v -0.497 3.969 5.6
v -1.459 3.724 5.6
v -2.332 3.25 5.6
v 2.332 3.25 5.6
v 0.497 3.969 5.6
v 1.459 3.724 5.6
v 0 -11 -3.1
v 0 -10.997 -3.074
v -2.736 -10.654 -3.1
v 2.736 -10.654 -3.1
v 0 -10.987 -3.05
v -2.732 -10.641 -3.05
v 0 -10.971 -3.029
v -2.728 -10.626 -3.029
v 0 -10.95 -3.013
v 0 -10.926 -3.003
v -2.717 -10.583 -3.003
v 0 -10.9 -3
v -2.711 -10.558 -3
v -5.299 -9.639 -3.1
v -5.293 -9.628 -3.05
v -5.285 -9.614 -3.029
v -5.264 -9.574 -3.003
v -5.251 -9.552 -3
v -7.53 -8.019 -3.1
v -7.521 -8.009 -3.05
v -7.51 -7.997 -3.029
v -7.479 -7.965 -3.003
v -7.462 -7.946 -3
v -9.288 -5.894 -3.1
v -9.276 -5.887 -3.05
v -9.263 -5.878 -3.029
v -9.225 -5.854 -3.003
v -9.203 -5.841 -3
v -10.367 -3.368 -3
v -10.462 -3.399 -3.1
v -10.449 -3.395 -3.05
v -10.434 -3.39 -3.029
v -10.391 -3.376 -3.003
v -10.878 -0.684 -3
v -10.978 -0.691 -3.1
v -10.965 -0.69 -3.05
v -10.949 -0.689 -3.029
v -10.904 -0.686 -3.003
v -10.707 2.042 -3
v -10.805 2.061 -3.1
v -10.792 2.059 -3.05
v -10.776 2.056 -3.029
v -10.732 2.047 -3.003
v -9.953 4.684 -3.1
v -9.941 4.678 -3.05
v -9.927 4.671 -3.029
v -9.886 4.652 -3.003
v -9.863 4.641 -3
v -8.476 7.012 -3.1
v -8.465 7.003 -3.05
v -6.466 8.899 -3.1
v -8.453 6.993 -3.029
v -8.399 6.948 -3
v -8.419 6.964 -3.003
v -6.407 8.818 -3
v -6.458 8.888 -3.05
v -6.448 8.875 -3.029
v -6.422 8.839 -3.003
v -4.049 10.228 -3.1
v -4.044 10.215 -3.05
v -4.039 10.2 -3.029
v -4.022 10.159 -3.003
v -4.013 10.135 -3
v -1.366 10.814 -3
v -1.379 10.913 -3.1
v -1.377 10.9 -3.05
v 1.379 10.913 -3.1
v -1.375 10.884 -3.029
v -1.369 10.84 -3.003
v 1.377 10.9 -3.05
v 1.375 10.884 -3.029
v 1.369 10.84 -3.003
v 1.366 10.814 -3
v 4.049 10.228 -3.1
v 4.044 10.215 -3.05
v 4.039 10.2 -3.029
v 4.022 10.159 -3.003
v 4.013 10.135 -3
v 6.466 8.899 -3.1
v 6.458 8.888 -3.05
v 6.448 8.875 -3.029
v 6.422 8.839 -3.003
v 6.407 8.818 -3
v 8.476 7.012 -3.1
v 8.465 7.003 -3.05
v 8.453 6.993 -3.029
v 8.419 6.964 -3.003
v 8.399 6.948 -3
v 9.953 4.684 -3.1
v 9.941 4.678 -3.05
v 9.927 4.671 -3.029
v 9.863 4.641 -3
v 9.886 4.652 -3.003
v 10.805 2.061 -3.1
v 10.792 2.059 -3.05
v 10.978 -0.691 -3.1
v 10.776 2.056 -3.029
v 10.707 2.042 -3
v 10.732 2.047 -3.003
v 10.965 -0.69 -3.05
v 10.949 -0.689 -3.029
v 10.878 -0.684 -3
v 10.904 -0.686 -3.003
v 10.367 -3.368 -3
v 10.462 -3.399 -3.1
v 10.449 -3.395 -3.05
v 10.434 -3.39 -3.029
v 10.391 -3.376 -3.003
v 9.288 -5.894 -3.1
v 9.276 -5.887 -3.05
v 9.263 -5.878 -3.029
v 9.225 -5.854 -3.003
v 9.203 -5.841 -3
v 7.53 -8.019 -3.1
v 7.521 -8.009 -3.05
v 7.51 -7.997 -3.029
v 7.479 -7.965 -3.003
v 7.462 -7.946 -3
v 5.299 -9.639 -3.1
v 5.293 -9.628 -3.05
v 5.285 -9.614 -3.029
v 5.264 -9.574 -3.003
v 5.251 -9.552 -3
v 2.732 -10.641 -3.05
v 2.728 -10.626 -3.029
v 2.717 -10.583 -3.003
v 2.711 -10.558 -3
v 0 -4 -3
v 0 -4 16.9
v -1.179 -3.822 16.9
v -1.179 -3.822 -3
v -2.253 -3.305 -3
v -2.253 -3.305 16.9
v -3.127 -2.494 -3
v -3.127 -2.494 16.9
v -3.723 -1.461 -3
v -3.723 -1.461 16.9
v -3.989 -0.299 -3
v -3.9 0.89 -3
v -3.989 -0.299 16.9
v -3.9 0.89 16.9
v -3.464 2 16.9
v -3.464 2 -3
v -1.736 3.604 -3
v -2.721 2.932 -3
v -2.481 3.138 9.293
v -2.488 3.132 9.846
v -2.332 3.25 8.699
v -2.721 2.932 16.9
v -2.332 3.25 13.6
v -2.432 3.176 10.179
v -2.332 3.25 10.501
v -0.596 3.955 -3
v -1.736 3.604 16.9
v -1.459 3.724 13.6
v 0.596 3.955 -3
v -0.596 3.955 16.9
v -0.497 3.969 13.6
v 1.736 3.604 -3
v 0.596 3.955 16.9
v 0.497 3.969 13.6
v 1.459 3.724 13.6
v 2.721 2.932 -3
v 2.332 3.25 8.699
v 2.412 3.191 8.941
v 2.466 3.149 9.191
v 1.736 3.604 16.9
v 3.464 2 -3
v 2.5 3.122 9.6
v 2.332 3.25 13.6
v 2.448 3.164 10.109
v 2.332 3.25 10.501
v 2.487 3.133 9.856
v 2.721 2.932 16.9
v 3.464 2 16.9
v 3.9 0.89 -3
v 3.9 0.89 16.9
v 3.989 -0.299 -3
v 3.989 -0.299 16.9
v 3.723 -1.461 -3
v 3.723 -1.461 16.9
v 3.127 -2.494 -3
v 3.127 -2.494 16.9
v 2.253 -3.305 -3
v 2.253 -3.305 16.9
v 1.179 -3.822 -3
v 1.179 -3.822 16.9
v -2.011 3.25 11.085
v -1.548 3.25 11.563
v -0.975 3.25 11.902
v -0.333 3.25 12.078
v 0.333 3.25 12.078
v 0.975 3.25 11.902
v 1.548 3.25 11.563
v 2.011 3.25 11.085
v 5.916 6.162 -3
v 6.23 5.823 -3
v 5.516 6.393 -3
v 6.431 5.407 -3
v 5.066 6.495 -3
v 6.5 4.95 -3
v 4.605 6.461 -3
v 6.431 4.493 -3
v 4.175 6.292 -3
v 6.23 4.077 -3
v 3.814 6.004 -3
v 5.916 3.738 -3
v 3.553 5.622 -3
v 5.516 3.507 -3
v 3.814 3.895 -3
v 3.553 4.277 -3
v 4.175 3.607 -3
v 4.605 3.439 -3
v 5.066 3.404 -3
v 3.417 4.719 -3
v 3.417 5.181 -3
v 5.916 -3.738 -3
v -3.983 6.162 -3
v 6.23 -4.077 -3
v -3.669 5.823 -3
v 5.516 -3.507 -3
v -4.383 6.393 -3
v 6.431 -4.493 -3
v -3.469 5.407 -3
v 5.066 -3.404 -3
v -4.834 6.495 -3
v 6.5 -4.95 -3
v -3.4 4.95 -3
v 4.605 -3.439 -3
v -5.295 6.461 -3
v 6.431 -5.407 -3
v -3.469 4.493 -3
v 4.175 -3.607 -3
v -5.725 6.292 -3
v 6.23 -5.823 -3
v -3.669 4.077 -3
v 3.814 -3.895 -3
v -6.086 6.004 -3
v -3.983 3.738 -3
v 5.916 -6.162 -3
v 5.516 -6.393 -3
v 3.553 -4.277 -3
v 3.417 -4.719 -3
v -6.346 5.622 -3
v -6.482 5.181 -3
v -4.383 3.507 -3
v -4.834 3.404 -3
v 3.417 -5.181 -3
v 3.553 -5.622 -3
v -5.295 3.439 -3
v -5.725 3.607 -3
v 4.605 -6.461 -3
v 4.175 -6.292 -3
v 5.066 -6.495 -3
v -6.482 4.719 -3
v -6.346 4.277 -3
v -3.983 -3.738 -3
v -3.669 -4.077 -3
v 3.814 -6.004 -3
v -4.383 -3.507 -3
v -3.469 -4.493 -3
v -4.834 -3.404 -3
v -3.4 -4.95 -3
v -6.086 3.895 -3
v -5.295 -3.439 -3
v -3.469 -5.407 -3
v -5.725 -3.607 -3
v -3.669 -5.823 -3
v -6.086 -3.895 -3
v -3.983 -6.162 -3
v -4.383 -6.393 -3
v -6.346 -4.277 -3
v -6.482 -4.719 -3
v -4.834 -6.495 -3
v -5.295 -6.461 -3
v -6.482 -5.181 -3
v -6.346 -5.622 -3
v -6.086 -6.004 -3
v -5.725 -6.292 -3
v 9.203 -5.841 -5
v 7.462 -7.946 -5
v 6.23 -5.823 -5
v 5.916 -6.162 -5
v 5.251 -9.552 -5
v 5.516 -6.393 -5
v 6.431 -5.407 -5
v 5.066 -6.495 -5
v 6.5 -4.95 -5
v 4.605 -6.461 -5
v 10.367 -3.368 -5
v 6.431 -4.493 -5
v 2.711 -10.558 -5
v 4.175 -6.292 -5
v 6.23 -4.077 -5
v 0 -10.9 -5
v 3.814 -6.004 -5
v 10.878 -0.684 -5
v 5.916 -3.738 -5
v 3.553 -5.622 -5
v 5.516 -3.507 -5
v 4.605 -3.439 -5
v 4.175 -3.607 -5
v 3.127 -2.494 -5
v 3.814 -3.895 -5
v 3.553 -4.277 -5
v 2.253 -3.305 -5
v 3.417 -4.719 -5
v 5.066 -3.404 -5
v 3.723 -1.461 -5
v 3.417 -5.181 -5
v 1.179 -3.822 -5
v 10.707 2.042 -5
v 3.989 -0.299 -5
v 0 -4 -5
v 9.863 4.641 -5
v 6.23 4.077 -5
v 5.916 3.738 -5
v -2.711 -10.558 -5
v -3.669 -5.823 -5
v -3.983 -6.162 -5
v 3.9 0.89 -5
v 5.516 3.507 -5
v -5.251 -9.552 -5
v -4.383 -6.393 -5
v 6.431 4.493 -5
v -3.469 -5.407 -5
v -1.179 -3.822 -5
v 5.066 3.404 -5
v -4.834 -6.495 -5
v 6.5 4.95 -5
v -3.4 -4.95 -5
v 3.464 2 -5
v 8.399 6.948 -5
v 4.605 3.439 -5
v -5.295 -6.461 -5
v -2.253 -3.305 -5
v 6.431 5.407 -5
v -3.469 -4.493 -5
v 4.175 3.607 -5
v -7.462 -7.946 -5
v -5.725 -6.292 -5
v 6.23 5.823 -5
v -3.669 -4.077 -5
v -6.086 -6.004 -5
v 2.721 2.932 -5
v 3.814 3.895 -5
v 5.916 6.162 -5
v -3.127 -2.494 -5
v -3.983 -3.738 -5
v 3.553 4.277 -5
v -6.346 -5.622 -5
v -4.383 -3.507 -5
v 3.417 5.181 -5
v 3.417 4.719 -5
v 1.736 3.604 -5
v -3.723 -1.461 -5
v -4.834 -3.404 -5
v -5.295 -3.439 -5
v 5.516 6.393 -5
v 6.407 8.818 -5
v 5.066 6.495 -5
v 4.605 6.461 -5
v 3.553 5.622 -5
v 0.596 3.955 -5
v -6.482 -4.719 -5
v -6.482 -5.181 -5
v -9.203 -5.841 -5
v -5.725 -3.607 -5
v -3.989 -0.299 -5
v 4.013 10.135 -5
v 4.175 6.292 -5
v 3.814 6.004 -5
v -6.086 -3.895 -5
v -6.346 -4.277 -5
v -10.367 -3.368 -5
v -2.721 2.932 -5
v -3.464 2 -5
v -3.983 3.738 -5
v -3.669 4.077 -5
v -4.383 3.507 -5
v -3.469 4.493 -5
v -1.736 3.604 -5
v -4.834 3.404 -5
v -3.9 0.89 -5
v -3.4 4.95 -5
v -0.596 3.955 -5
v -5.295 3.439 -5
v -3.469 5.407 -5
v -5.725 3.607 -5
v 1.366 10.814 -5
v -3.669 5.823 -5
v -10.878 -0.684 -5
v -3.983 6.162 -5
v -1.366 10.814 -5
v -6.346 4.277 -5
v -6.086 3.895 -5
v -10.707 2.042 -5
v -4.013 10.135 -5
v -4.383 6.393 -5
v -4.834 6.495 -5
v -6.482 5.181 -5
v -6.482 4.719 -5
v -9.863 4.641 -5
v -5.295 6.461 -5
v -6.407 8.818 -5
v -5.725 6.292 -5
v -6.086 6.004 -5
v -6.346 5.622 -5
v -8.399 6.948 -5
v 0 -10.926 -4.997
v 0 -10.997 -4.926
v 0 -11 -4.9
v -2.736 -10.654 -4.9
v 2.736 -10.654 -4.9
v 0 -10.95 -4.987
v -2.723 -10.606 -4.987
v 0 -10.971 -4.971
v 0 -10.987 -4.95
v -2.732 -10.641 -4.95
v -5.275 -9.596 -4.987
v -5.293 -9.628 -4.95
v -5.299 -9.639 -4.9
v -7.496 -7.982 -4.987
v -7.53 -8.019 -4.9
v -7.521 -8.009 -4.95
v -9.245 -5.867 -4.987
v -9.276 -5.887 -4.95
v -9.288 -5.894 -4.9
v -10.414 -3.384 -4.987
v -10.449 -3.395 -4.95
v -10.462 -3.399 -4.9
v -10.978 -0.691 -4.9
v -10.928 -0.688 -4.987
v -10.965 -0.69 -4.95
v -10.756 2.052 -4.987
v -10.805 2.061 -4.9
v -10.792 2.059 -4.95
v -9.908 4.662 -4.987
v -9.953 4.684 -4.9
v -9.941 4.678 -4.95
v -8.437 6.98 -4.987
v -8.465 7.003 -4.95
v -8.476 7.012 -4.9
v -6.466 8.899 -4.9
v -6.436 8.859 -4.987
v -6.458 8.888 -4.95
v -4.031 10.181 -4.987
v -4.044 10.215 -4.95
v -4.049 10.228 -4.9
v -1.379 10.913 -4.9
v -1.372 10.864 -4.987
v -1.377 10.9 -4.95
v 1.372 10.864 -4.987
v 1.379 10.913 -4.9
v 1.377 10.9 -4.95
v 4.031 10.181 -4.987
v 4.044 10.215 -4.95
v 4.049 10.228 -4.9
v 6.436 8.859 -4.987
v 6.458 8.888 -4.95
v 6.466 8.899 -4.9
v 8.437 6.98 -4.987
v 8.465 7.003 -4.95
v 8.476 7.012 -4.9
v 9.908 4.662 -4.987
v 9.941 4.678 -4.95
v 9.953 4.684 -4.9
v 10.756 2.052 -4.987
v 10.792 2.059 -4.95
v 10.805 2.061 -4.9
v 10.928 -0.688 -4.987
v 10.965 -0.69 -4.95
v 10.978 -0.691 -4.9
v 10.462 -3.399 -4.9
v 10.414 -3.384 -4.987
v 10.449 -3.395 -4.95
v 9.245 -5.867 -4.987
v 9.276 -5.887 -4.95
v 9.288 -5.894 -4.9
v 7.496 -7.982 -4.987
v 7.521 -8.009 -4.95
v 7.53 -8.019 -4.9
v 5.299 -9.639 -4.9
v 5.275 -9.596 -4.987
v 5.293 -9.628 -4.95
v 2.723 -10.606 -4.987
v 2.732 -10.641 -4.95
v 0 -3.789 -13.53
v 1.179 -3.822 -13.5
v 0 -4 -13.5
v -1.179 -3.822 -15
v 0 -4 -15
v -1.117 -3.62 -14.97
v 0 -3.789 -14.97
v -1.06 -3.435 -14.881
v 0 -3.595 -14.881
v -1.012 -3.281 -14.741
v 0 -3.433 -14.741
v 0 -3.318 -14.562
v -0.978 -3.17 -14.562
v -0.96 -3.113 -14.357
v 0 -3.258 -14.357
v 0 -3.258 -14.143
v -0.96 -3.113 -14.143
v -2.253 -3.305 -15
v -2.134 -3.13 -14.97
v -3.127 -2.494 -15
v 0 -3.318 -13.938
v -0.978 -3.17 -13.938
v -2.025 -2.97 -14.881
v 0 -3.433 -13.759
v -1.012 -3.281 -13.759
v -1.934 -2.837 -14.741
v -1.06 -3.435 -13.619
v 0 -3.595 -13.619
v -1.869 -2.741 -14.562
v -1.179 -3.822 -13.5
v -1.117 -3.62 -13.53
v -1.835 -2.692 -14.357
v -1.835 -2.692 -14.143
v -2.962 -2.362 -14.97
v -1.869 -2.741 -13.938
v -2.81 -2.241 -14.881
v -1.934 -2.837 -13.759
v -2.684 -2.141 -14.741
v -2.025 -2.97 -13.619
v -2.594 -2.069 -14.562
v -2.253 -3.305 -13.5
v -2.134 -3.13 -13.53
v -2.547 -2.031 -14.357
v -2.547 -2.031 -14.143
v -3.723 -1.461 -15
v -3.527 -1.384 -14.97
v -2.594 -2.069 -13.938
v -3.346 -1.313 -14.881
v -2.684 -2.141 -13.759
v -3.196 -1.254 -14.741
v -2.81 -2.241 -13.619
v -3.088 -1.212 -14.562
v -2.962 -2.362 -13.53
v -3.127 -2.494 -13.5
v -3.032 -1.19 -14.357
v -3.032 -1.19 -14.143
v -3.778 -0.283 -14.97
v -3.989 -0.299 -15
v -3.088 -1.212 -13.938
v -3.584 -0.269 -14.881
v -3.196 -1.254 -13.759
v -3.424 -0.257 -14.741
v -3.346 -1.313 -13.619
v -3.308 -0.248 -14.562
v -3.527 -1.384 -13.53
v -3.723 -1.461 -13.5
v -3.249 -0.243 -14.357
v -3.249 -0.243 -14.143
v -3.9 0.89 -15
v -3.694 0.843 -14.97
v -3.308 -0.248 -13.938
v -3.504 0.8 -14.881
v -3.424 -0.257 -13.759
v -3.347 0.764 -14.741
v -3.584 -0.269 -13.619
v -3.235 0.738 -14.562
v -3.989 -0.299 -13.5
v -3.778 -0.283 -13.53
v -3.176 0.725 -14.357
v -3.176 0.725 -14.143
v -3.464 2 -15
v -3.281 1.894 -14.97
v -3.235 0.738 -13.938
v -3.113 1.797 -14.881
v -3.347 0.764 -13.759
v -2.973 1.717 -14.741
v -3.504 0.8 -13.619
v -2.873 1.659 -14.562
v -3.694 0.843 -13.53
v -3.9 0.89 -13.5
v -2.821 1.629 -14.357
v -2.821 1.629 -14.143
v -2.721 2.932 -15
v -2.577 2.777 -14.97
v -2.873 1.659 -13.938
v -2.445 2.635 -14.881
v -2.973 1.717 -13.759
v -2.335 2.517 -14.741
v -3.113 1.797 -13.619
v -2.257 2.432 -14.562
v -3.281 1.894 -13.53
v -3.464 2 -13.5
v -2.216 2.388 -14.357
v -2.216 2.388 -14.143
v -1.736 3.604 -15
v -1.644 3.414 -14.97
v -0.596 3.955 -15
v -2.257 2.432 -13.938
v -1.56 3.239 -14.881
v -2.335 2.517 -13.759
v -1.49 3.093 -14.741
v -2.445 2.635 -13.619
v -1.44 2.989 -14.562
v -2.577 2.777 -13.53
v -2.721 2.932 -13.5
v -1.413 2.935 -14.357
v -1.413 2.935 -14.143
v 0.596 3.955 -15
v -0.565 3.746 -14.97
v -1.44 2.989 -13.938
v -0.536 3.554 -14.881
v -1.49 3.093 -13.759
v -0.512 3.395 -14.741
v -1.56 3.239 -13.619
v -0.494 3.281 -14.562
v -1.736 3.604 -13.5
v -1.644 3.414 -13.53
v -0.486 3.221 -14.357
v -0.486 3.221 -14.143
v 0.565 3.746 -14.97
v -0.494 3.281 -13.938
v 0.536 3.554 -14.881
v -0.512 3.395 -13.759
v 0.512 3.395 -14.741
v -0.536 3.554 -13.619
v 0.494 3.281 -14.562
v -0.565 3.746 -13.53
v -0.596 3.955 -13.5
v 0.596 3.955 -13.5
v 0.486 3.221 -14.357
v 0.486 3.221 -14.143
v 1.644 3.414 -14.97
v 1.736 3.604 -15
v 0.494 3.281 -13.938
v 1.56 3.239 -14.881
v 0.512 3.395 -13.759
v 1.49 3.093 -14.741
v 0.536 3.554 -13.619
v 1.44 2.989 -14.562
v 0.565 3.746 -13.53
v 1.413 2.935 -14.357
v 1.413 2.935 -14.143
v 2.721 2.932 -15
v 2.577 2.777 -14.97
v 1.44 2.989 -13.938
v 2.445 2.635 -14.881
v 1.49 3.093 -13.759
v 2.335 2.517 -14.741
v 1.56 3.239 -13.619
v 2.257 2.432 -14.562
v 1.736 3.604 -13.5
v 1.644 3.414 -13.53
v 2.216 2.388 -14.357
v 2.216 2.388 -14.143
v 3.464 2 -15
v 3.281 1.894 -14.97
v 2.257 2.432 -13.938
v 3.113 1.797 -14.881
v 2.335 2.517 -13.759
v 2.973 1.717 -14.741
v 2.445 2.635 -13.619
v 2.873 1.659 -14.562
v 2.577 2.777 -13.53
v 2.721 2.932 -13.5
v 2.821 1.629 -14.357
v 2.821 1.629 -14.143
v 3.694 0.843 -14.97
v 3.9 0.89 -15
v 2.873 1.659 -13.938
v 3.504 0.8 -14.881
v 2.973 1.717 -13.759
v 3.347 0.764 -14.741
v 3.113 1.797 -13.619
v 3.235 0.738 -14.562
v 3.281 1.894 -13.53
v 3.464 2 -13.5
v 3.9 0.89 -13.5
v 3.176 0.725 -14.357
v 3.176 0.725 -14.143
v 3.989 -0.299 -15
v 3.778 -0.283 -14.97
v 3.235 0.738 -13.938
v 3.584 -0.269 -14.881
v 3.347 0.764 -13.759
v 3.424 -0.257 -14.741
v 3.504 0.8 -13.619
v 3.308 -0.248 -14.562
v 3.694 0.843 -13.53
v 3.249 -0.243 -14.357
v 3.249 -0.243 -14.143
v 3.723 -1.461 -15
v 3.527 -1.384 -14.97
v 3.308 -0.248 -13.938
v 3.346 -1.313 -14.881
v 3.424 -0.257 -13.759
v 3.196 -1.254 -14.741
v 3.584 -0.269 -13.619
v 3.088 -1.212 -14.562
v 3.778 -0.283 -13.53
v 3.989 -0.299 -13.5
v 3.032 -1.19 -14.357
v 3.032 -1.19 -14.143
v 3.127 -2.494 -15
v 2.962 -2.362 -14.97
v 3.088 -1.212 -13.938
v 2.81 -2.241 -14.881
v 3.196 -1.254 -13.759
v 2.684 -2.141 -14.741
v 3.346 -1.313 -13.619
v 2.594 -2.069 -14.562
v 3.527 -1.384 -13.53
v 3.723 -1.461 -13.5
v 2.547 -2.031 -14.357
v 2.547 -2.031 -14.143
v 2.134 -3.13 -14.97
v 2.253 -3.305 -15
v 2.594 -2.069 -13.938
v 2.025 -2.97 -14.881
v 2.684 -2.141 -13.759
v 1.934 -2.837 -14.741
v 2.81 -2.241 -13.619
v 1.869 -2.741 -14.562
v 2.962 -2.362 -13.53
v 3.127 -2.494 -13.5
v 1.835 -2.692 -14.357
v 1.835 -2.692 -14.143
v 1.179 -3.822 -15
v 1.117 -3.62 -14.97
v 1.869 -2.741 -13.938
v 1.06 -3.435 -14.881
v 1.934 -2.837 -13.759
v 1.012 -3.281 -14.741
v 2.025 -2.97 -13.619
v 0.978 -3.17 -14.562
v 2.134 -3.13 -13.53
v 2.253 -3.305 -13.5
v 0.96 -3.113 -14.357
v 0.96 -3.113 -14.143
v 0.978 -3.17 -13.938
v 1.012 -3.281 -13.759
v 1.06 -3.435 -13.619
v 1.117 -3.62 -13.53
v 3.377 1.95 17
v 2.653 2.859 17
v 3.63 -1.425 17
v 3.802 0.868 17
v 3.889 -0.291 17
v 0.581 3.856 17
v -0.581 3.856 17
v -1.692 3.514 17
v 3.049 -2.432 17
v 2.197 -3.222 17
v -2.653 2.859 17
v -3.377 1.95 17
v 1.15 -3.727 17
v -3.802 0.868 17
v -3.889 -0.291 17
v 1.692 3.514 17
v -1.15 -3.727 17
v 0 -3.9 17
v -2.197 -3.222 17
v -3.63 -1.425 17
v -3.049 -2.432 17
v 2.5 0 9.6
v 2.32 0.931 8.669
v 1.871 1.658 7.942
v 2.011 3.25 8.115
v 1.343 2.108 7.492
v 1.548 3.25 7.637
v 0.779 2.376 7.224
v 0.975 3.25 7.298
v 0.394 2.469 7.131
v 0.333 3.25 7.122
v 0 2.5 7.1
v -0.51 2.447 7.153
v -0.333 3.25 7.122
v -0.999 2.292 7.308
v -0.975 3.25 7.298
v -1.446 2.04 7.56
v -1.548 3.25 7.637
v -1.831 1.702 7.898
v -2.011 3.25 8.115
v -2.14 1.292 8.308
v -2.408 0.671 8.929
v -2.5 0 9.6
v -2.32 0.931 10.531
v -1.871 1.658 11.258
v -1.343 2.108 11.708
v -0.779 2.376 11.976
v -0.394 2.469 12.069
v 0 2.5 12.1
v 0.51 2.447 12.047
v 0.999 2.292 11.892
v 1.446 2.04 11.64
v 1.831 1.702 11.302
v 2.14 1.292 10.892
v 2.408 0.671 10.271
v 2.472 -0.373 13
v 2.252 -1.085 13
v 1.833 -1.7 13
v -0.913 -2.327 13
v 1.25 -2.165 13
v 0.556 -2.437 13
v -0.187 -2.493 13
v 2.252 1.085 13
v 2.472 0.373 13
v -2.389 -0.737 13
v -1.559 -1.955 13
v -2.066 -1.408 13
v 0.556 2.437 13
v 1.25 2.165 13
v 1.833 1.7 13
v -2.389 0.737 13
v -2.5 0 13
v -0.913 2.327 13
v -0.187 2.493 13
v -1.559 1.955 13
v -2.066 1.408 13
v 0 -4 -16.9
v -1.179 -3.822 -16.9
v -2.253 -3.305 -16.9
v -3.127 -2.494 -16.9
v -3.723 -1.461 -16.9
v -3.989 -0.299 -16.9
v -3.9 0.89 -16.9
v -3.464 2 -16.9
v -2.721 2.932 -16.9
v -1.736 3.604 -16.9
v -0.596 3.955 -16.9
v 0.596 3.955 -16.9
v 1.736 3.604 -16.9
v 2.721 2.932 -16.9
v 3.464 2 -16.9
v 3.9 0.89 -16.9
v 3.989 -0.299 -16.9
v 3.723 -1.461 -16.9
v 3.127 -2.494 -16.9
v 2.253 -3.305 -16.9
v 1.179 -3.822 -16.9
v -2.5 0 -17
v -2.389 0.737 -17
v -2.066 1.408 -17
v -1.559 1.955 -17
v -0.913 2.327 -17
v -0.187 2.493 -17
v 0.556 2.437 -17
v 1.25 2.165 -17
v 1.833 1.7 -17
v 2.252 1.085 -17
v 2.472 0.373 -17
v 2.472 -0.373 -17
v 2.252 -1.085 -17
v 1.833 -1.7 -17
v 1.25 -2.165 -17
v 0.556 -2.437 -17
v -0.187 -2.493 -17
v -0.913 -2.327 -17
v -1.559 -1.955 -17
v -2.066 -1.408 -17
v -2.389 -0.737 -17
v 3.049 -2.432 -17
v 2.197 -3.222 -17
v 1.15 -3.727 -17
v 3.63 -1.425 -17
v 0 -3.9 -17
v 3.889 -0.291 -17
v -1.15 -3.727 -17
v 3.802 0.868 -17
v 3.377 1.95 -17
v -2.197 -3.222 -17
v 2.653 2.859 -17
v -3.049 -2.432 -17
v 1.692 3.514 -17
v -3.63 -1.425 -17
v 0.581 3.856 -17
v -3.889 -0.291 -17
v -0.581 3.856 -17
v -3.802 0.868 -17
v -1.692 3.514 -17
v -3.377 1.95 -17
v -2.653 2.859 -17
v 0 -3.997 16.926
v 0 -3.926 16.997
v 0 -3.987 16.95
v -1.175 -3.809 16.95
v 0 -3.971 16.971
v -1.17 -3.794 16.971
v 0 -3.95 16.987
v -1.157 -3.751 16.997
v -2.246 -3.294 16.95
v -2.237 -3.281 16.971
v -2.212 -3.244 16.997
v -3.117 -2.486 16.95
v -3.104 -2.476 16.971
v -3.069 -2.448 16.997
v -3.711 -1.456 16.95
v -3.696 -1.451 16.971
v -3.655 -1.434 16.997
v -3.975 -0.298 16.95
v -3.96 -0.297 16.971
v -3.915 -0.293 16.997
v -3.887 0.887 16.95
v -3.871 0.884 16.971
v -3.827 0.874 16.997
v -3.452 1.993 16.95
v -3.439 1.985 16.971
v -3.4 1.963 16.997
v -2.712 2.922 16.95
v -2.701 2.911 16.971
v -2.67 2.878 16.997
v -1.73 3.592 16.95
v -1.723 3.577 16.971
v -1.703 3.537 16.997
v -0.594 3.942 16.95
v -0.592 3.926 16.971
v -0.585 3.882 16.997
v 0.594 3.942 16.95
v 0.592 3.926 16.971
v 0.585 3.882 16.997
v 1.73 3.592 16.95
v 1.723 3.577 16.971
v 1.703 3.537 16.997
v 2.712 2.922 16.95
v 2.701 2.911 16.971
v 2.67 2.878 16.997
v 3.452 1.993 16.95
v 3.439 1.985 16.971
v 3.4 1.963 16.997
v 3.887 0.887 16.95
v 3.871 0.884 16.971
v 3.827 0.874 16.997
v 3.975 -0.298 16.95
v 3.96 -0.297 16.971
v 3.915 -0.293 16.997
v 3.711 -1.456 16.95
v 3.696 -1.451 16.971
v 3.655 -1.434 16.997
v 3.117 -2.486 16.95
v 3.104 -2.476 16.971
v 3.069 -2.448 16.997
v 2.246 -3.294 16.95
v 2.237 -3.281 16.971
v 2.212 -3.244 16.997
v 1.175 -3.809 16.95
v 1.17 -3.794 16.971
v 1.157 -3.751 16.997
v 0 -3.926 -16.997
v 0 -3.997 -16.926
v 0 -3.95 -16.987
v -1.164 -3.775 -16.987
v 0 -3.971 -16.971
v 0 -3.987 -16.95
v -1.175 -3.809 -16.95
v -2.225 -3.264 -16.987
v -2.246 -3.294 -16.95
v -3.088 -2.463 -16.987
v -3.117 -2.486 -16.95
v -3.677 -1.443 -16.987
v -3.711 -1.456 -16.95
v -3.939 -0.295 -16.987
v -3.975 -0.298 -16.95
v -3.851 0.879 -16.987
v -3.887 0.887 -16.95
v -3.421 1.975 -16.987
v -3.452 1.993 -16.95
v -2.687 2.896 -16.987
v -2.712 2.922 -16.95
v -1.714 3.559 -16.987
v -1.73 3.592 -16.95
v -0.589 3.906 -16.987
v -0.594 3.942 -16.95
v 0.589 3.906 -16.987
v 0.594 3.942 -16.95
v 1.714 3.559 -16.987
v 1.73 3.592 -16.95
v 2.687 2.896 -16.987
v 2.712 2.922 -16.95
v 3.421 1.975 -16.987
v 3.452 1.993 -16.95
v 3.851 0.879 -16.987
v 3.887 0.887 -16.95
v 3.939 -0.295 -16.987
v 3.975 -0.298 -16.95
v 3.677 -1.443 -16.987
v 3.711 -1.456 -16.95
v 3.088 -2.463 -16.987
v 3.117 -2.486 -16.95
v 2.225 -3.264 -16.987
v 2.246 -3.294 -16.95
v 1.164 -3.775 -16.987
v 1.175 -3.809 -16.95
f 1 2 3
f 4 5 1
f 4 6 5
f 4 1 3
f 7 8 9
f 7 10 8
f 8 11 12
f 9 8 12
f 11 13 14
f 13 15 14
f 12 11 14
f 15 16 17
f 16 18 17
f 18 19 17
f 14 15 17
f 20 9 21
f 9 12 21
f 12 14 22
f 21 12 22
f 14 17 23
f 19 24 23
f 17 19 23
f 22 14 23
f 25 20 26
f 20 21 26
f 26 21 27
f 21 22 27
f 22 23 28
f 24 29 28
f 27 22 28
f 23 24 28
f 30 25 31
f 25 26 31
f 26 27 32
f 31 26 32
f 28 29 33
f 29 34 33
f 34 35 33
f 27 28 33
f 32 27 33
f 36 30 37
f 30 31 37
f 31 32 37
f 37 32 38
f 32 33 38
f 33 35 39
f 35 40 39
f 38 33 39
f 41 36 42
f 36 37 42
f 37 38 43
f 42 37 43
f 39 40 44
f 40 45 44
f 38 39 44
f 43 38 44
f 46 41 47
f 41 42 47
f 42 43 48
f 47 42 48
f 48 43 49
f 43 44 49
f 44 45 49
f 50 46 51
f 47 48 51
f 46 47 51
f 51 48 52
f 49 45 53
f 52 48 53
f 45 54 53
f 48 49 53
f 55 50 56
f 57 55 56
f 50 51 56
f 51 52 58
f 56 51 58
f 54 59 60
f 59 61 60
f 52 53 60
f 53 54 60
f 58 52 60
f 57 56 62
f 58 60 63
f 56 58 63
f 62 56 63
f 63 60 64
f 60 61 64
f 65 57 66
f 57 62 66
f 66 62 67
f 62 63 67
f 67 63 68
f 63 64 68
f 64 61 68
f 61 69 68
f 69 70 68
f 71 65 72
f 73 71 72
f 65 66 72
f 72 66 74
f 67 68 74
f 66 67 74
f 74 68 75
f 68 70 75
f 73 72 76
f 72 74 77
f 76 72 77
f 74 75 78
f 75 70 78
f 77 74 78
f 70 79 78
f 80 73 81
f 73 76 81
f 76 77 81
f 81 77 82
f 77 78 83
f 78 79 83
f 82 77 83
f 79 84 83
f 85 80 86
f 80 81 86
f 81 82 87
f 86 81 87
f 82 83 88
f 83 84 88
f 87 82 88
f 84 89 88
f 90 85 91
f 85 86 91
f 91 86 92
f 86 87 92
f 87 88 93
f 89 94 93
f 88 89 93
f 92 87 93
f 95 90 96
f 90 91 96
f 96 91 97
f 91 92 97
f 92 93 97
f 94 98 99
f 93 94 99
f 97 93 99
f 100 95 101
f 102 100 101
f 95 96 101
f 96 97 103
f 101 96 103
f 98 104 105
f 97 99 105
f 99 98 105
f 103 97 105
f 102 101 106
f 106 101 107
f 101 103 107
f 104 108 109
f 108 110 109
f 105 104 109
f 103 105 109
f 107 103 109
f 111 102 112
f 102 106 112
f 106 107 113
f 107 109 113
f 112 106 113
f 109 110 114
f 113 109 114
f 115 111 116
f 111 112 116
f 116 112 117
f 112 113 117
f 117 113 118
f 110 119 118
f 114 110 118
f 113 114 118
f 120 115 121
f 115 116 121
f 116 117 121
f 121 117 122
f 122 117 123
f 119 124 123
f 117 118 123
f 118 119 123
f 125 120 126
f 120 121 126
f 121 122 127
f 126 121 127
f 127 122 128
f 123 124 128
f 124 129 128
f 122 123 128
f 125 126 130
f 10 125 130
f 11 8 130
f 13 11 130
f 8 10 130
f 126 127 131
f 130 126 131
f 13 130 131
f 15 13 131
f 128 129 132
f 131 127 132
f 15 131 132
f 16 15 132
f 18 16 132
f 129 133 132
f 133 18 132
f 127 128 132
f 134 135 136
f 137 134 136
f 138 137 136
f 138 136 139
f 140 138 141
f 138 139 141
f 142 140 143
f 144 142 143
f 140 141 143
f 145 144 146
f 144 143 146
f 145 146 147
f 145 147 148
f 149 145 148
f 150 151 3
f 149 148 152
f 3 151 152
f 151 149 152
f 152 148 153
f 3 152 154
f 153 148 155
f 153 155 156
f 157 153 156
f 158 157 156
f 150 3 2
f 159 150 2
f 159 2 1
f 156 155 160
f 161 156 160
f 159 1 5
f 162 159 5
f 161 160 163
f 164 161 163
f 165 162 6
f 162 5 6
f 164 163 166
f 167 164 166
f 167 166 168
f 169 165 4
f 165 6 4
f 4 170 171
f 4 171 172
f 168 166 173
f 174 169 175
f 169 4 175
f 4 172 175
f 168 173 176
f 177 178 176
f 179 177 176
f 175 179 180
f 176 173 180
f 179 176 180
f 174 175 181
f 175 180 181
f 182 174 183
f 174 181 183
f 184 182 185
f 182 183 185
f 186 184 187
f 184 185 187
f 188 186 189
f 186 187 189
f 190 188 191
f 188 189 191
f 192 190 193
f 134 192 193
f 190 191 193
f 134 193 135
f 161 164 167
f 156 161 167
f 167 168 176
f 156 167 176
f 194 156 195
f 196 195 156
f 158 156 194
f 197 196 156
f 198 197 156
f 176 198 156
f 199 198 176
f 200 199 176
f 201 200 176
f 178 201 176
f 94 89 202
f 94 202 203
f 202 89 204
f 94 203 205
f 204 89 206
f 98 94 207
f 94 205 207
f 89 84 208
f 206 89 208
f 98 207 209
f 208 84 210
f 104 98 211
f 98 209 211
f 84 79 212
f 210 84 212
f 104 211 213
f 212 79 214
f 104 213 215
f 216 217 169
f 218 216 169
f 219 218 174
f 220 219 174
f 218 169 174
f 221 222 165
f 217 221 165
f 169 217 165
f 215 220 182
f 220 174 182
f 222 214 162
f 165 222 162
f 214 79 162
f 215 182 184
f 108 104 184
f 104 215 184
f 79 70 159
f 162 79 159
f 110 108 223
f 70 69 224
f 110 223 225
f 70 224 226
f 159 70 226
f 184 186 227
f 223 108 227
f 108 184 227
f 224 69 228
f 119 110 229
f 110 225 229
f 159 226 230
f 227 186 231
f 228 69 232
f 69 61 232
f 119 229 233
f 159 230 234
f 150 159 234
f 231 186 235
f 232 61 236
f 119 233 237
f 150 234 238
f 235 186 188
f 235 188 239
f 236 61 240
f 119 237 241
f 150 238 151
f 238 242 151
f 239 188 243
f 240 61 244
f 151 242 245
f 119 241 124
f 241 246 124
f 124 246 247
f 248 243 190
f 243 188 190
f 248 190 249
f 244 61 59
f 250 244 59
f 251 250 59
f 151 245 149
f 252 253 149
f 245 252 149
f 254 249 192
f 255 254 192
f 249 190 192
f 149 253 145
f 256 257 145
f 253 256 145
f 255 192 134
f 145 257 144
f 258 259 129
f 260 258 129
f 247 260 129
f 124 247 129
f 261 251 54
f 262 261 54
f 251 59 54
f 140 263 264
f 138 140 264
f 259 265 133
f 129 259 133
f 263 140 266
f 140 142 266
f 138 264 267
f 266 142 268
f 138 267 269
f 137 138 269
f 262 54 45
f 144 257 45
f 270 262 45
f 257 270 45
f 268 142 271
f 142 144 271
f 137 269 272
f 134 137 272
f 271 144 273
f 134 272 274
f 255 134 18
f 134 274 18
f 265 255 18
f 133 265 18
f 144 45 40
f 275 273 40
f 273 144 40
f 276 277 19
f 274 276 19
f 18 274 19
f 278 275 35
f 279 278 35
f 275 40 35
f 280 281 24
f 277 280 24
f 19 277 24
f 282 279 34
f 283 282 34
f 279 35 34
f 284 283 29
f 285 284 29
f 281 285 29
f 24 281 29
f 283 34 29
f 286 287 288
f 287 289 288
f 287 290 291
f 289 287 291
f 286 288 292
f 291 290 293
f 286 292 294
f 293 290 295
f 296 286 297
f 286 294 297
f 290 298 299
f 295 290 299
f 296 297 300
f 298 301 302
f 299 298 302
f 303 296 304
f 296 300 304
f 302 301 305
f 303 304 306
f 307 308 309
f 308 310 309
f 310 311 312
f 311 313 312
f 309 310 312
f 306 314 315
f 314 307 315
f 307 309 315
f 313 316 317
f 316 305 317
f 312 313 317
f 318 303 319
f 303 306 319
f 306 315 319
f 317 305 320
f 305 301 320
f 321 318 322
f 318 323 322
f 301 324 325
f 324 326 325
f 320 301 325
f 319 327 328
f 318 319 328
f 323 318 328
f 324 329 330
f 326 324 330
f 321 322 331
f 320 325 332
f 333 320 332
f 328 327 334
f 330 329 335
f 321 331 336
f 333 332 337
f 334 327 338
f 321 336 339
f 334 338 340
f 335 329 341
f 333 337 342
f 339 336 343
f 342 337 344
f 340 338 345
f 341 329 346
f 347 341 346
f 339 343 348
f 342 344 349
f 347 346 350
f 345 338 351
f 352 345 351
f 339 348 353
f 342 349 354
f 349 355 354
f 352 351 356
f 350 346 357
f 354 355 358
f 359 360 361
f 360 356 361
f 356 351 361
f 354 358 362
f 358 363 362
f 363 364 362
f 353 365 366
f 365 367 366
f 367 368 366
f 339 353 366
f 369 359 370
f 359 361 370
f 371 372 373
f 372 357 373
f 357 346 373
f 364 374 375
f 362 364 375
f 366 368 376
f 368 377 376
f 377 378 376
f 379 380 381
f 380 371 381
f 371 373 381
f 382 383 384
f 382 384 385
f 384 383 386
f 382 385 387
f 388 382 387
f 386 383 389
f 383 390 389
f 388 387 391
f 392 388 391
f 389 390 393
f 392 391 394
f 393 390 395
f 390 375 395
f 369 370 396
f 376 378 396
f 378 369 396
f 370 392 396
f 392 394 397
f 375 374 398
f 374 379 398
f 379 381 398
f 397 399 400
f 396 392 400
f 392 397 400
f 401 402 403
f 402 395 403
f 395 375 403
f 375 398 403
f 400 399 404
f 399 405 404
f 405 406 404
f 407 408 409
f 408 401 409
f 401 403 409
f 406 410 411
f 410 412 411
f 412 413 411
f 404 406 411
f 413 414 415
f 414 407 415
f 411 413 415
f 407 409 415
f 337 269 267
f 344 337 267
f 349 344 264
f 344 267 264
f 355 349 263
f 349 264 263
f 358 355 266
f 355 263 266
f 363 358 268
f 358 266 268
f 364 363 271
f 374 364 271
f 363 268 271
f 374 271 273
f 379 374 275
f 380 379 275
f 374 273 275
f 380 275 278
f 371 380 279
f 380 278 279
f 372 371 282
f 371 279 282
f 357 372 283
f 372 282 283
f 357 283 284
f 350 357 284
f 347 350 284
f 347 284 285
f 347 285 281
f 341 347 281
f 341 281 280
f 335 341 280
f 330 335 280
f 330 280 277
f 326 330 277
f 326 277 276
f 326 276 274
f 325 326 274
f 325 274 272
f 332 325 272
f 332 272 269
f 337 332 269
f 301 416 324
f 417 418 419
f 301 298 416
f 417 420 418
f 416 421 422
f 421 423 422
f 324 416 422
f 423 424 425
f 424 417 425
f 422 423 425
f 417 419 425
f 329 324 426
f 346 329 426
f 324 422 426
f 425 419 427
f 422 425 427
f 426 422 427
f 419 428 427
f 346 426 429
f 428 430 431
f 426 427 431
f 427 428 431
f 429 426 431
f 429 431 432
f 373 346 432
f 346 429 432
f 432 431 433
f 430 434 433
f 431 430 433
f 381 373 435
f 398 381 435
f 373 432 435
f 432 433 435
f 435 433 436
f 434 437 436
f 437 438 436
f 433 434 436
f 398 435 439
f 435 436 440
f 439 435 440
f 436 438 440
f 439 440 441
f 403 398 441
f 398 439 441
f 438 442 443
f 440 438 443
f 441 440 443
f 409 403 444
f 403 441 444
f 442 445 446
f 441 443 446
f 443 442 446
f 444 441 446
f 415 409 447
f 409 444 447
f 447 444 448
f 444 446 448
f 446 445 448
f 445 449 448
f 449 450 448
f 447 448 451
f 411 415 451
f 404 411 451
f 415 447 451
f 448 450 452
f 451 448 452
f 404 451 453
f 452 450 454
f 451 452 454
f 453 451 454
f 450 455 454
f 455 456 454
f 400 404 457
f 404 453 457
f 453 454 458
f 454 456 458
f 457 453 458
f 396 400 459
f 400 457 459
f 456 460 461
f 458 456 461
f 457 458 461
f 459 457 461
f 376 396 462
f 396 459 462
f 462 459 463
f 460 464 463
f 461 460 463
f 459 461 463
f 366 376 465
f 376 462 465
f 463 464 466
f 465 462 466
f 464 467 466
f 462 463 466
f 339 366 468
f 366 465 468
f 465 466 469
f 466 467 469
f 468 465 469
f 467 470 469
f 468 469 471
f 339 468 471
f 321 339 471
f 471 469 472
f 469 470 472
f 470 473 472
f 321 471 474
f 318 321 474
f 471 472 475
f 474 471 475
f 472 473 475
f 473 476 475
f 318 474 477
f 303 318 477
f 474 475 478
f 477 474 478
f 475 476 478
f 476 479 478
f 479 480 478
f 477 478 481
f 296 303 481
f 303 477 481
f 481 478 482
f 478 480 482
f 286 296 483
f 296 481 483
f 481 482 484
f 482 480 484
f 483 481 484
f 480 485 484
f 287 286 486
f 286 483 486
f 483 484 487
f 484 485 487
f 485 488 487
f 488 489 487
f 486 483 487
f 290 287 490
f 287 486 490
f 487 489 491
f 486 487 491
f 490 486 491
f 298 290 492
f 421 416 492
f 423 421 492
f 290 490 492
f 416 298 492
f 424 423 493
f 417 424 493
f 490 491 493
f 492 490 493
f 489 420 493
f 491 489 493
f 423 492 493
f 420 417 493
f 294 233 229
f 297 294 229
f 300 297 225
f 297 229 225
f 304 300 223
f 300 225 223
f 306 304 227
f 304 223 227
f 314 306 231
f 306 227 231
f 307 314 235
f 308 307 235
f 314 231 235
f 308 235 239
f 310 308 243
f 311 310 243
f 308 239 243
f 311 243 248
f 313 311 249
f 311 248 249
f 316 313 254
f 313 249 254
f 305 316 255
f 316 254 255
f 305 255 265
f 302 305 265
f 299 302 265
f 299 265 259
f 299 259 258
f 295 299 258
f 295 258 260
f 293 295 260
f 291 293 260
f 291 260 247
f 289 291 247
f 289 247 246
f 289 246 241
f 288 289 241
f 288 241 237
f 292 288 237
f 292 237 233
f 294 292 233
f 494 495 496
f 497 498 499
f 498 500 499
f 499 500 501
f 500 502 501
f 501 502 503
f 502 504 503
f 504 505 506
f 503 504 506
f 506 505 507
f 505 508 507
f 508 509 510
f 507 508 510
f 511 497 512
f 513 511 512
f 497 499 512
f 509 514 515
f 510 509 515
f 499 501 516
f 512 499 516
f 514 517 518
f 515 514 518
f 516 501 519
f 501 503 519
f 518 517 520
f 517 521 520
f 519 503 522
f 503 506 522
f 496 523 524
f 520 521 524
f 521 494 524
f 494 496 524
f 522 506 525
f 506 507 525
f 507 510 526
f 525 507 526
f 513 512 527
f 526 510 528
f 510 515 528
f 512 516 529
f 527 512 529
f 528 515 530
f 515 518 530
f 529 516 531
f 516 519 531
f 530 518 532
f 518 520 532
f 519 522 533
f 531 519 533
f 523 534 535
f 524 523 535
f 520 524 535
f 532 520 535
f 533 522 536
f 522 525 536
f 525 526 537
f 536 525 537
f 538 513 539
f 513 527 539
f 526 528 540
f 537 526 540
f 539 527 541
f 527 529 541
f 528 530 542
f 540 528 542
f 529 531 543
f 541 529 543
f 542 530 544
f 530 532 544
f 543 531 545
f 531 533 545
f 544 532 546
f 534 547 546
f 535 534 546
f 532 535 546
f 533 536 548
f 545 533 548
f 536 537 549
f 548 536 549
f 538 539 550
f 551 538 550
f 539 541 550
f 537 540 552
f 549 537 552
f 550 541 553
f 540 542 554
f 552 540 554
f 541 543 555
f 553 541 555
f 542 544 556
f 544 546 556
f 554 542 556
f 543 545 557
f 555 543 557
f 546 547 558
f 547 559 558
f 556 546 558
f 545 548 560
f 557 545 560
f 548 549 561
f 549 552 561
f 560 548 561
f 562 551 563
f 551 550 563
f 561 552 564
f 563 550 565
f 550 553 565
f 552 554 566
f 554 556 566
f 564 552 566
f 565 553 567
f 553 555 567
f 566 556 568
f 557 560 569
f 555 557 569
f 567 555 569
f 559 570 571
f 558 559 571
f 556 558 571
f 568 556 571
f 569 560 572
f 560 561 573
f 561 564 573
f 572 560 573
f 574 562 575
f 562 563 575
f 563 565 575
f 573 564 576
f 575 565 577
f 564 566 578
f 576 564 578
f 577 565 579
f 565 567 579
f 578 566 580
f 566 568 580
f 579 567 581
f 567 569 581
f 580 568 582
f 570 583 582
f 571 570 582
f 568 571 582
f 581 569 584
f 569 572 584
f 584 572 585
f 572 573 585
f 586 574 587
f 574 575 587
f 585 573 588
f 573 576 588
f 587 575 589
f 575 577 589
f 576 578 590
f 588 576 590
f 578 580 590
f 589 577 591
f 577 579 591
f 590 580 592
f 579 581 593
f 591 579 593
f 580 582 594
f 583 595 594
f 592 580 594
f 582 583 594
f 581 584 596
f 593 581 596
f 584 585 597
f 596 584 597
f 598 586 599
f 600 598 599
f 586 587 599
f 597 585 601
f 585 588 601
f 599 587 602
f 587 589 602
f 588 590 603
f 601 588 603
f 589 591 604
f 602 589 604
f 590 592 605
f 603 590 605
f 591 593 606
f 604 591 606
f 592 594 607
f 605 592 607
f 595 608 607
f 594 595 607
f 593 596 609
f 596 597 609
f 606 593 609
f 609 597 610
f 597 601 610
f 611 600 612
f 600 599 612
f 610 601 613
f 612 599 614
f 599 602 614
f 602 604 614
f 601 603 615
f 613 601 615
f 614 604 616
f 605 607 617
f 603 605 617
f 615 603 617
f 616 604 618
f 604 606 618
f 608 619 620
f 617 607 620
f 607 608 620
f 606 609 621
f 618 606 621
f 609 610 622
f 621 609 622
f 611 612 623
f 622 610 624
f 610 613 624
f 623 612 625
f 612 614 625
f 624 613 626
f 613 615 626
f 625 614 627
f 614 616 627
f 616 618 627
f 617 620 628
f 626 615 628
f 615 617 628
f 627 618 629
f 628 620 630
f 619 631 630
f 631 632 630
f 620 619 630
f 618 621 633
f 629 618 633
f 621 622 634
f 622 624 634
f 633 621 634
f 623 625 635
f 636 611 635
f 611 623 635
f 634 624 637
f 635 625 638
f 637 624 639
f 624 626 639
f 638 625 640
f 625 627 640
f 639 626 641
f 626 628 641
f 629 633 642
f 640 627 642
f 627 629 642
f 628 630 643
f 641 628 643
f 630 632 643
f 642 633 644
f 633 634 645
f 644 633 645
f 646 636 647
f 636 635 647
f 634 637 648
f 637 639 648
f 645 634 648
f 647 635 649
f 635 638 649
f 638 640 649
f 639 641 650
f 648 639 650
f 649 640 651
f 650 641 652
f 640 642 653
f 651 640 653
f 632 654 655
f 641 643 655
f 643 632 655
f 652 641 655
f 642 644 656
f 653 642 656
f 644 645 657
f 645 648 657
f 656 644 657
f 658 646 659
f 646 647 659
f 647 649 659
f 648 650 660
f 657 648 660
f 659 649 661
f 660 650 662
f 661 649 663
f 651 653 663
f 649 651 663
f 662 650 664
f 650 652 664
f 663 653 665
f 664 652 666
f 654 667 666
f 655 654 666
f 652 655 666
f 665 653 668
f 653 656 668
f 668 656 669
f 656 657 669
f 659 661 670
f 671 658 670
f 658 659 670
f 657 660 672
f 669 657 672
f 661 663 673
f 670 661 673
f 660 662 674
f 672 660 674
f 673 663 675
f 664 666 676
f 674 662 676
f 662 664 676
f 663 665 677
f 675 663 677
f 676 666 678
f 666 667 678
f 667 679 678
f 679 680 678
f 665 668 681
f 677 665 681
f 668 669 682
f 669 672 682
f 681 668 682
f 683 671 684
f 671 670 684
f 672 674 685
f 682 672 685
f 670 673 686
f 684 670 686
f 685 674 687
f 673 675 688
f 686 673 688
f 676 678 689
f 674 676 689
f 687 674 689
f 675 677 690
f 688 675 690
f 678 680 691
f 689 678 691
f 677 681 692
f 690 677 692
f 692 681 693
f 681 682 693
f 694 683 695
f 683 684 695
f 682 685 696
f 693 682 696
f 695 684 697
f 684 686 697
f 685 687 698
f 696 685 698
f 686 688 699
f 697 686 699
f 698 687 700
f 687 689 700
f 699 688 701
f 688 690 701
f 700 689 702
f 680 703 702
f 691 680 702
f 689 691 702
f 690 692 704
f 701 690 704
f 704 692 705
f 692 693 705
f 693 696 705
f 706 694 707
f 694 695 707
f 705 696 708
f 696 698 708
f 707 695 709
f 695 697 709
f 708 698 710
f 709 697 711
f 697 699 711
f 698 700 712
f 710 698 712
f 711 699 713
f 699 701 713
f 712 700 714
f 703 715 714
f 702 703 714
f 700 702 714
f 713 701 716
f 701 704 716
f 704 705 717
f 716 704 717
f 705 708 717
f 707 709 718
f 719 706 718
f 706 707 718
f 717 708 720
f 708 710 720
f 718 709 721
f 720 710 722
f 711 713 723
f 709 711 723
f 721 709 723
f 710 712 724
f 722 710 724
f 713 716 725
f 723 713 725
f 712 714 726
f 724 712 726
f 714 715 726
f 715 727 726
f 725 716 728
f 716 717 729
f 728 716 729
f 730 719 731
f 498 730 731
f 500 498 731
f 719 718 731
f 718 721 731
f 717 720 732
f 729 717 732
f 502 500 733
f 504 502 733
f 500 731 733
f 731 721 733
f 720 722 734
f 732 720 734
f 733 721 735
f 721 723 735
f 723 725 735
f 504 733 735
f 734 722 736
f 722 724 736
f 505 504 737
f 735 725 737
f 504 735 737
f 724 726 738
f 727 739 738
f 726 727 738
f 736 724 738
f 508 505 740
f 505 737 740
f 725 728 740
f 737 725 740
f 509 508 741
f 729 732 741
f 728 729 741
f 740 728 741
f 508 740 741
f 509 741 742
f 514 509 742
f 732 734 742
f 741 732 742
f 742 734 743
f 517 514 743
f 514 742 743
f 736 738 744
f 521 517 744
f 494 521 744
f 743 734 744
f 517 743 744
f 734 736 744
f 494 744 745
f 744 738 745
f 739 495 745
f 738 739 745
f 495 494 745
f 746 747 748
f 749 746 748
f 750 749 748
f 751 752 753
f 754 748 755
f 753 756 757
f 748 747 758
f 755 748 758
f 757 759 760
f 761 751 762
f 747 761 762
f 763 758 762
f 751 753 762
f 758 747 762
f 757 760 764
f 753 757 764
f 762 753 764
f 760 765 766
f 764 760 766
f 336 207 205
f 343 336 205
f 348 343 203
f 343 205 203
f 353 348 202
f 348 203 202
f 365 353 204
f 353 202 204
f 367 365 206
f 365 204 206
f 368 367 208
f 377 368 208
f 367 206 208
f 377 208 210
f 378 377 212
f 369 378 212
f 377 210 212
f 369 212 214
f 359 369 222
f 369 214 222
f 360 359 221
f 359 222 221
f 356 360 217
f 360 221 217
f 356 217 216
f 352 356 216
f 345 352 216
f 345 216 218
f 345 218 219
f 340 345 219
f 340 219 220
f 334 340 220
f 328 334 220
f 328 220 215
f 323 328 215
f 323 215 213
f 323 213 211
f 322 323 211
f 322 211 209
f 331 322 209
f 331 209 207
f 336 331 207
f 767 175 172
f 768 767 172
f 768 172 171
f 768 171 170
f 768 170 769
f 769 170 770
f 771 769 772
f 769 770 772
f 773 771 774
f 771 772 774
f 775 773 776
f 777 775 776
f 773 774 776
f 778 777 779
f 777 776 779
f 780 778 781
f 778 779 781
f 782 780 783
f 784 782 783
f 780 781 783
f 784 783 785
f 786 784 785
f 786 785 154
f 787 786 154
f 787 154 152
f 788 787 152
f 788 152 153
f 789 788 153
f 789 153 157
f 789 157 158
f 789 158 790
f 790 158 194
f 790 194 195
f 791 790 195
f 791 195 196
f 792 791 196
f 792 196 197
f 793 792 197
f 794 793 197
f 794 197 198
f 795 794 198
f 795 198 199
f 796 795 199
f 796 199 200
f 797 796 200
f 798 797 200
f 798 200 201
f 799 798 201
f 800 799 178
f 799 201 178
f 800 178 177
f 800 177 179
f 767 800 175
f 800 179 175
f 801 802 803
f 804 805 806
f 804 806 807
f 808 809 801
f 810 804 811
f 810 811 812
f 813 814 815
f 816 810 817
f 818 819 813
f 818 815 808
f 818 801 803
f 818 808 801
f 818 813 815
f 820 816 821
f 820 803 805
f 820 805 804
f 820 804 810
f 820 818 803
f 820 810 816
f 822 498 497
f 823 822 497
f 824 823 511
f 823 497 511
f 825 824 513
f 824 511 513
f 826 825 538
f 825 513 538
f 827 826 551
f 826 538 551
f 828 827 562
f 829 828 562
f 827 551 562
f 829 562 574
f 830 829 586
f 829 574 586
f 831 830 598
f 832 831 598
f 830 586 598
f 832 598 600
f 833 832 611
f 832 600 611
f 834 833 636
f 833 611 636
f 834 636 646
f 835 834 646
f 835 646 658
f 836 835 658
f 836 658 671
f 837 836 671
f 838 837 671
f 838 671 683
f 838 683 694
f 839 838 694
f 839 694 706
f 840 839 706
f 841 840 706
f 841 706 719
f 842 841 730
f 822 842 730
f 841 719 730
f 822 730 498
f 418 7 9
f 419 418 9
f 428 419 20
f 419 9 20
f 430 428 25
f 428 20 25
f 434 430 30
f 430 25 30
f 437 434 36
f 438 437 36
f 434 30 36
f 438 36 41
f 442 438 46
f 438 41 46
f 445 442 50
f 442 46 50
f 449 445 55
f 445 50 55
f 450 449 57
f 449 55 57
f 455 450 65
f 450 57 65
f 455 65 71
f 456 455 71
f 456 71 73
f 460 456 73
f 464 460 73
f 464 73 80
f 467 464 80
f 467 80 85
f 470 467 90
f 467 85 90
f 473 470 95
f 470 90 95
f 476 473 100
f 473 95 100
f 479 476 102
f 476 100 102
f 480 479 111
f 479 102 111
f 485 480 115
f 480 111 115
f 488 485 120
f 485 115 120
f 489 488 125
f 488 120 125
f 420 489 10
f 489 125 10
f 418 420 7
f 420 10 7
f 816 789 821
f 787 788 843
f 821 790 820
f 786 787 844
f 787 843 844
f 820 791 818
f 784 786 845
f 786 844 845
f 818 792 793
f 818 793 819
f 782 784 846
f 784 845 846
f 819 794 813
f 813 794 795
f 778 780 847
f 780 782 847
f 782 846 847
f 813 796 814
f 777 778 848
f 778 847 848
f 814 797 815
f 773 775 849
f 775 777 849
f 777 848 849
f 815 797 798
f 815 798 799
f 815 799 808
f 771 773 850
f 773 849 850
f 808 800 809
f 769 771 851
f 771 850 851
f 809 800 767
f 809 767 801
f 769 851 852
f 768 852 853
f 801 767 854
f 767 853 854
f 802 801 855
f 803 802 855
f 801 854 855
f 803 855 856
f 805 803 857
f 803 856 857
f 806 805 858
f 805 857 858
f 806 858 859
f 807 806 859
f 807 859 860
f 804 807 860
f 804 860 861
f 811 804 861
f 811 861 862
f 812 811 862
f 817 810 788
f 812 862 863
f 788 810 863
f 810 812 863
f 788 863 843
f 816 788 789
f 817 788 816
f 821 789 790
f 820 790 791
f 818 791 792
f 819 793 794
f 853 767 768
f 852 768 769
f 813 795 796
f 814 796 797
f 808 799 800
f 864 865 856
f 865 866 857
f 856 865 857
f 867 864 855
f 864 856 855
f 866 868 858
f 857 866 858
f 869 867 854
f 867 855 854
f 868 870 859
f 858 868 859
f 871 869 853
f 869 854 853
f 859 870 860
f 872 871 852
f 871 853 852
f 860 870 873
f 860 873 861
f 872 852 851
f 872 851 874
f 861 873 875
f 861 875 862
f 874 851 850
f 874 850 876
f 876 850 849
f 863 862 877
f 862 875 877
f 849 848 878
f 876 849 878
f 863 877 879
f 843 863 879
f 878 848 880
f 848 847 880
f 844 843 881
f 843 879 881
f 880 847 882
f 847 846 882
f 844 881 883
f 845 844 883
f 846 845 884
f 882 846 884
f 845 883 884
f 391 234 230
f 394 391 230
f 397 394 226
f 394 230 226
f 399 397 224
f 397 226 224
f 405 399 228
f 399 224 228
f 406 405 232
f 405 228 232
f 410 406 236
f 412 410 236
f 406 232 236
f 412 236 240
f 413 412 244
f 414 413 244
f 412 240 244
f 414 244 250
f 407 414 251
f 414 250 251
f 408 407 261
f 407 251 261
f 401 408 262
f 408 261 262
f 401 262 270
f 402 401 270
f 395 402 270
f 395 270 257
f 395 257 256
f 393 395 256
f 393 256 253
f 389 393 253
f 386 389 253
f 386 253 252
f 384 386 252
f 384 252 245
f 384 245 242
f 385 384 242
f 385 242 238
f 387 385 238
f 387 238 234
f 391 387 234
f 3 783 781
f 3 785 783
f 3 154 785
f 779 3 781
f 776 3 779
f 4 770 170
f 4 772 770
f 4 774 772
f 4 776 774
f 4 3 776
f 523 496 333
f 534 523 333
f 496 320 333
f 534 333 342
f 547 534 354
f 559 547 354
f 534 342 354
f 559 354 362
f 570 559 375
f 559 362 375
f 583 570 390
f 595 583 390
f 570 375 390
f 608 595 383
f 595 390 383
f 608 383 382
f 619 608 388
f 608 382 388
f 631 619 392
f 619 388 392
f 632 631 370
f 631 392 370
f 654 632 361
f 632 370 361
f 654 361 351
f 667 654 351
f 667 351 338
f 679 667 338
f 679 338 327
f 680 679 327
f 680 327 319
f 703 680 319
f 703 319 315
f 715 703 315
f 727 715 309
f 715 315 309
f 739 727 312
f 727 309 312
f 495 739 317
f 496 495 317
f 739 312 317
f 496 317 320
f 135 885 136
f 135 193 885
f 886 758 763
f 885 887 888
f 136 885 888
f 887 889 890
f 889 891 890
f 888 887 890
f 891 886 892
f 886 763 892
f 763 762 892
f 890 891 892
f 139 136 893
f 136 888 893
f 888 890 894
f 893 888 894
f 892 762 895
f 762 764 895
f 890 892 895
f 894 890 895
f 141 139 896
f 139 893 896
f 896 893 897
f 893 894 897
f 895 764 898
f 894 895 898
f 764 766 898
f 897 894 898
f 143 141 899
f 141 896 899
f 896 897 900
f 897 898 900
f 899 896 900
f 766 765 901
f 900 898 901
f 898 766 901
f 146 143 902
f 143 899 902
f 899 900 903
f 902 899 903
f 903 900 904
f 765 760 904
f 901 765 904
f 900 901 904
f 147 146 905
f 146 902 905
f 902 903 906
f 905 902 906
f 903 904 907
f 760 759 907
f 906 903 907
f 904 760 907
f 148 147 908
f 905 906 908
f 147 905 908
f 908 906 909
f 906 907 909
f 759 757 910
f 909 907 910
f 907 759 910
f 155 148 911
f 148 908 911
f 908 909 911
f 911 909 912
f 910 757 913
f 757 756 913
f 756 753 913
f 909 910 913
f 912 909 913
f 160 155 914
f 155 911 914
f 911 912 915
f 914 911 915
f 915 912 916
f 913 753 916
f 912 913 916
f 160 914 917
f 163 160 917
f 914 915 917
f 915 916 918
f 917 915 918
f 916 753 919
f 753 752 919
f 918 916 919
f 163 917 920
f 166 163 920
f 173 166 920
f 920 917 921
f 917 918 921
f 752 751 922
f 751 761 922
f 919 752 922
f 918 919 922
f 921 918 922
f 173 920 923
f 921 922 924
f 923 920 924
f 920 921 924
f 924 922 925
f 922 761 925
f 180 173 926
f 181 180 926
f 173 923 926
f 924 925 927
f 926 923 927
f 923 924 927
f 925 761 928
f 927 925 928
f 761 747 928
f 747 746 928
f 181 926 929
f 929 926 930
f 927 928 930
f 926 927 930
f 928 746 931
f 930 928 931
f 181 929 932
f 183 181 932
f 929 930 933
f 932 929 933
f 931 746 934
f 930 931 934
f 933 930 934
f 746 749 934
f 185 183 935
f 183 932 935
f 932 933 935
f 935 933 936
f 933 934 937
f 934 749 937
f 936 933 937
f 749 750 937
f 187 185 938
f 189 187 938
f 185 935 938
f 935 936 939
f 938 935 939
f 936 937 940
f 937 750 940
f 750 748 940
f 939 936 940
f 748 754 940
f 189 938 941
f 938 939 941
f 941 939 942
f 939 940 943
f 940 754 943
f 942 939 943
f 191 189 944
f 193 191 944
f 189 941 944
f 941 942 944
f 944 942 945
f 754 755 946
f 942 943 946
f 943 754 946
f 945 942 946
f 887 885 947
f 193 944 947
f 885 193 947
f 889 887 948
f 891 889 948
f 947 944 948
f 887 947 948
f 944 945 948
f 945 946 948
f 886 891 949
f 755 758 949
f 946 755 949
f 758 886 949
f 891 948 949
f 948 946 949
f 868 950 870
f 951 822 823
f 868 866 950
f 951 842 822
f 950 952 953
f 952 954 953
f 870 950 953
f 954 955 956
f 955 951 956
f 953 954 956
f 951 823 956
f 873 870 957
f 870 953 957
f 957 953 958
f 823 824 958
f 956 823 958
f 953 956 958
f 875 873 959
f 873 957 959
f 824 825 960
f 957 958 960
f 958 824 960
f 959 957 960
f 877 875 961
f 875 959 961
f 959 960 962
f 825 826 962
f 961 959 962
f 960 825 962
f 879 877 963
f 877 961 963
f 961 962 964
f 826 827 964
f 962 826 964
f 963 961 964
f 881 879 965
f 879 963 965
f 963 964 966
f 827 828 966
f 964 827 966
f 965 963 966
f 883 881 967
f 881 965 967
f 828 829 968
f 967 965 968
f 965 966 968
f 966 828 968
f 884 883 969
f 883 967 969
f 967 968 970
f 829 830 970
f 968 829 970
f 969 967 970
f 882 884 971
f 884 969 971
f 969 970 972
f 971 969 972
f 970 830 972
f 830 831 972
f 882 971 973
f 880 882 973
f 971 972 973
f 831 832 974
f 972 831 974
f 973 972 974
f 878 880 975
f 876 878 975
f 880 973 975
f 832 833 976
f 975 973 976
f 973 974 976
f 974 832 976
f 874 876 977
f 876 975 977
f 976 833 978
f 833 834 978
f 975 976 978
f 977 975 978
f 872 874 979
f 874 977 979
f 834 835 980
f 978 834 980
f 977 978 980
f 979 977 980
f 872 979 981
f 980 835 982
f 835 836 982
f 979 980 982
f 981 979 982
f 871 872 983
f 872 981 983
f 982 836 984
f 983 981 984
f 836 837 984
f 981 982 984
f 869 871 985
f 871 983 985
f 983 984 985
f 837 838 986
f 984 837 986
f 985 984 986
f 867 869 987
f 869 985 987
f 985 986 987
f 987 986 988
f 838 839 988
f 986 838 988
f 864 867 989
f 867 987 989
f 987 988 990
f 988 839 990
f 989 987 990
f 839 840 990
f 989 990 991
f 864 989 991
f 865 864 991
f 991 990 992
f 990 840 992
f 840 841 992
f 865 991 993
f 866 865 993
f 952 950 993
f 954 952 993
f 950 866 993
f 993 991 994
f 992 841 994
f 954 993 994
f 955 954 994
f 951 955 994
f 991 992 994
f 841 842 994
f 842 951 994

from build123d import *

# Parameters (mm, degrees)
SKETCH3_R          = 1.55
CUT_EXTRUDE1_DEPTH = 10
FILLET2_R          = 0.1
SKETCH5_W          = 5
SKETCH5_H          = 8
CUT_EXTRUDE3_DEPTH = 0.75
SKETCH6_R          = 2.5
CUT_EXTRUDE4_DEPTH = 3.25
SKETCH7_R          = 2.5
CUT_EXTRUDE5_DEPTH = 30


with BuildPart() as part:
    # Sketch2 → Revolve1 (revolve)
    with BuildSketch(Plane(origin=(0, 0, 0), x_dir=(0, 0, -1), z_dir=(1, 0, 0))):
        with BuildLine():
            Line((-17, 0), (17, 0))
            Line((17, 0), (17, -4))
            Line((17, -4), (15, -4))
            ThreePointArc((15, -4), (14.25, -3.25), (13.5, -4))
            Line((13.5, -4), (5, -4))
            Line((5, -4), (5, -11))
            Line((5, -11), (3, -11))
            Line((3, -11), (3, -4))
            Line((3, -4), (-17, -4))
            Line((-17, -4), (-17, 0))
        make_face()
    revolve(axis=Axis((0, 0, 17), (0, 0, -1)))

    # Sketch3 → Cut-Extrude1 (cut)
    with BuildSketch(Plane.XY.offset(-3)):
        with Locations((-4.949747468, 4.949747468)):
            Circle(SKETCH3_R)
        with Locations((4.949747468, 4.949747468)):
            Circle(SKETCH3_R)
        with Locations((4.949747468, -4.949747468)):
            Circle(SKETCH3_R)
        with Locations((-4.949747468, -4.949747468)):
            Circle(SKETCH3_R)
    extrude(amount=-CUT_EXTRUDE1_DEPTH, mode=Mode.SUBTRACT)

    # Fillet2
    fillet2_edges = [part.edges().sort_by_distance(p)[0] for p in [
        (0, 4, -17),
        (0, 4, 17),
        (0, 11, -3),
        (0, 11, -5),
    ]]
    fillet(fillet2_edges, radius=FILLET2_R)

    # Sketch5 → Cut-Extrude3 (cut)
    with BuildSketch(Plane(origin=(0, 4, 0), x_dir=(1, 0, 0), z_dir=(0, 1, 0))):
        with Locations((0, -9.6)):
            Rectangle(SKETCH5_W, SKETCH5_H)
    extrude(amount=-CUT_EXTRUDE3_DEPTH, mode=Mode.SUBTRACT)

    # Sketch6 → Cut-Extrude4 (cut)
    with BuildSketch(Plane(origin=(0, 3.25, 0), x_dir=(1, 0, 0), z_dir=(0, 1, 0))):
        with Locations((0, -9.6)):
            Circle(SKETCH6_R)
    extrude(amount=-CUT_EXTRUDE4_DEPTH, mode=Mode.SUBTRACT)

    # Sketch7 → Cut-Extrude5 (cut)
    with BuildSketch(Plane(origin=(0, 0, -17), x_dir=(-1, 0, 0), z_dir=(0, 0, -1))):
        Circle(SKETCH7_R)
    extrude(amount=-CUT_EXTRUDE5_DEPTH, mode=Mode.SUBTRACT)


solid = part.part
